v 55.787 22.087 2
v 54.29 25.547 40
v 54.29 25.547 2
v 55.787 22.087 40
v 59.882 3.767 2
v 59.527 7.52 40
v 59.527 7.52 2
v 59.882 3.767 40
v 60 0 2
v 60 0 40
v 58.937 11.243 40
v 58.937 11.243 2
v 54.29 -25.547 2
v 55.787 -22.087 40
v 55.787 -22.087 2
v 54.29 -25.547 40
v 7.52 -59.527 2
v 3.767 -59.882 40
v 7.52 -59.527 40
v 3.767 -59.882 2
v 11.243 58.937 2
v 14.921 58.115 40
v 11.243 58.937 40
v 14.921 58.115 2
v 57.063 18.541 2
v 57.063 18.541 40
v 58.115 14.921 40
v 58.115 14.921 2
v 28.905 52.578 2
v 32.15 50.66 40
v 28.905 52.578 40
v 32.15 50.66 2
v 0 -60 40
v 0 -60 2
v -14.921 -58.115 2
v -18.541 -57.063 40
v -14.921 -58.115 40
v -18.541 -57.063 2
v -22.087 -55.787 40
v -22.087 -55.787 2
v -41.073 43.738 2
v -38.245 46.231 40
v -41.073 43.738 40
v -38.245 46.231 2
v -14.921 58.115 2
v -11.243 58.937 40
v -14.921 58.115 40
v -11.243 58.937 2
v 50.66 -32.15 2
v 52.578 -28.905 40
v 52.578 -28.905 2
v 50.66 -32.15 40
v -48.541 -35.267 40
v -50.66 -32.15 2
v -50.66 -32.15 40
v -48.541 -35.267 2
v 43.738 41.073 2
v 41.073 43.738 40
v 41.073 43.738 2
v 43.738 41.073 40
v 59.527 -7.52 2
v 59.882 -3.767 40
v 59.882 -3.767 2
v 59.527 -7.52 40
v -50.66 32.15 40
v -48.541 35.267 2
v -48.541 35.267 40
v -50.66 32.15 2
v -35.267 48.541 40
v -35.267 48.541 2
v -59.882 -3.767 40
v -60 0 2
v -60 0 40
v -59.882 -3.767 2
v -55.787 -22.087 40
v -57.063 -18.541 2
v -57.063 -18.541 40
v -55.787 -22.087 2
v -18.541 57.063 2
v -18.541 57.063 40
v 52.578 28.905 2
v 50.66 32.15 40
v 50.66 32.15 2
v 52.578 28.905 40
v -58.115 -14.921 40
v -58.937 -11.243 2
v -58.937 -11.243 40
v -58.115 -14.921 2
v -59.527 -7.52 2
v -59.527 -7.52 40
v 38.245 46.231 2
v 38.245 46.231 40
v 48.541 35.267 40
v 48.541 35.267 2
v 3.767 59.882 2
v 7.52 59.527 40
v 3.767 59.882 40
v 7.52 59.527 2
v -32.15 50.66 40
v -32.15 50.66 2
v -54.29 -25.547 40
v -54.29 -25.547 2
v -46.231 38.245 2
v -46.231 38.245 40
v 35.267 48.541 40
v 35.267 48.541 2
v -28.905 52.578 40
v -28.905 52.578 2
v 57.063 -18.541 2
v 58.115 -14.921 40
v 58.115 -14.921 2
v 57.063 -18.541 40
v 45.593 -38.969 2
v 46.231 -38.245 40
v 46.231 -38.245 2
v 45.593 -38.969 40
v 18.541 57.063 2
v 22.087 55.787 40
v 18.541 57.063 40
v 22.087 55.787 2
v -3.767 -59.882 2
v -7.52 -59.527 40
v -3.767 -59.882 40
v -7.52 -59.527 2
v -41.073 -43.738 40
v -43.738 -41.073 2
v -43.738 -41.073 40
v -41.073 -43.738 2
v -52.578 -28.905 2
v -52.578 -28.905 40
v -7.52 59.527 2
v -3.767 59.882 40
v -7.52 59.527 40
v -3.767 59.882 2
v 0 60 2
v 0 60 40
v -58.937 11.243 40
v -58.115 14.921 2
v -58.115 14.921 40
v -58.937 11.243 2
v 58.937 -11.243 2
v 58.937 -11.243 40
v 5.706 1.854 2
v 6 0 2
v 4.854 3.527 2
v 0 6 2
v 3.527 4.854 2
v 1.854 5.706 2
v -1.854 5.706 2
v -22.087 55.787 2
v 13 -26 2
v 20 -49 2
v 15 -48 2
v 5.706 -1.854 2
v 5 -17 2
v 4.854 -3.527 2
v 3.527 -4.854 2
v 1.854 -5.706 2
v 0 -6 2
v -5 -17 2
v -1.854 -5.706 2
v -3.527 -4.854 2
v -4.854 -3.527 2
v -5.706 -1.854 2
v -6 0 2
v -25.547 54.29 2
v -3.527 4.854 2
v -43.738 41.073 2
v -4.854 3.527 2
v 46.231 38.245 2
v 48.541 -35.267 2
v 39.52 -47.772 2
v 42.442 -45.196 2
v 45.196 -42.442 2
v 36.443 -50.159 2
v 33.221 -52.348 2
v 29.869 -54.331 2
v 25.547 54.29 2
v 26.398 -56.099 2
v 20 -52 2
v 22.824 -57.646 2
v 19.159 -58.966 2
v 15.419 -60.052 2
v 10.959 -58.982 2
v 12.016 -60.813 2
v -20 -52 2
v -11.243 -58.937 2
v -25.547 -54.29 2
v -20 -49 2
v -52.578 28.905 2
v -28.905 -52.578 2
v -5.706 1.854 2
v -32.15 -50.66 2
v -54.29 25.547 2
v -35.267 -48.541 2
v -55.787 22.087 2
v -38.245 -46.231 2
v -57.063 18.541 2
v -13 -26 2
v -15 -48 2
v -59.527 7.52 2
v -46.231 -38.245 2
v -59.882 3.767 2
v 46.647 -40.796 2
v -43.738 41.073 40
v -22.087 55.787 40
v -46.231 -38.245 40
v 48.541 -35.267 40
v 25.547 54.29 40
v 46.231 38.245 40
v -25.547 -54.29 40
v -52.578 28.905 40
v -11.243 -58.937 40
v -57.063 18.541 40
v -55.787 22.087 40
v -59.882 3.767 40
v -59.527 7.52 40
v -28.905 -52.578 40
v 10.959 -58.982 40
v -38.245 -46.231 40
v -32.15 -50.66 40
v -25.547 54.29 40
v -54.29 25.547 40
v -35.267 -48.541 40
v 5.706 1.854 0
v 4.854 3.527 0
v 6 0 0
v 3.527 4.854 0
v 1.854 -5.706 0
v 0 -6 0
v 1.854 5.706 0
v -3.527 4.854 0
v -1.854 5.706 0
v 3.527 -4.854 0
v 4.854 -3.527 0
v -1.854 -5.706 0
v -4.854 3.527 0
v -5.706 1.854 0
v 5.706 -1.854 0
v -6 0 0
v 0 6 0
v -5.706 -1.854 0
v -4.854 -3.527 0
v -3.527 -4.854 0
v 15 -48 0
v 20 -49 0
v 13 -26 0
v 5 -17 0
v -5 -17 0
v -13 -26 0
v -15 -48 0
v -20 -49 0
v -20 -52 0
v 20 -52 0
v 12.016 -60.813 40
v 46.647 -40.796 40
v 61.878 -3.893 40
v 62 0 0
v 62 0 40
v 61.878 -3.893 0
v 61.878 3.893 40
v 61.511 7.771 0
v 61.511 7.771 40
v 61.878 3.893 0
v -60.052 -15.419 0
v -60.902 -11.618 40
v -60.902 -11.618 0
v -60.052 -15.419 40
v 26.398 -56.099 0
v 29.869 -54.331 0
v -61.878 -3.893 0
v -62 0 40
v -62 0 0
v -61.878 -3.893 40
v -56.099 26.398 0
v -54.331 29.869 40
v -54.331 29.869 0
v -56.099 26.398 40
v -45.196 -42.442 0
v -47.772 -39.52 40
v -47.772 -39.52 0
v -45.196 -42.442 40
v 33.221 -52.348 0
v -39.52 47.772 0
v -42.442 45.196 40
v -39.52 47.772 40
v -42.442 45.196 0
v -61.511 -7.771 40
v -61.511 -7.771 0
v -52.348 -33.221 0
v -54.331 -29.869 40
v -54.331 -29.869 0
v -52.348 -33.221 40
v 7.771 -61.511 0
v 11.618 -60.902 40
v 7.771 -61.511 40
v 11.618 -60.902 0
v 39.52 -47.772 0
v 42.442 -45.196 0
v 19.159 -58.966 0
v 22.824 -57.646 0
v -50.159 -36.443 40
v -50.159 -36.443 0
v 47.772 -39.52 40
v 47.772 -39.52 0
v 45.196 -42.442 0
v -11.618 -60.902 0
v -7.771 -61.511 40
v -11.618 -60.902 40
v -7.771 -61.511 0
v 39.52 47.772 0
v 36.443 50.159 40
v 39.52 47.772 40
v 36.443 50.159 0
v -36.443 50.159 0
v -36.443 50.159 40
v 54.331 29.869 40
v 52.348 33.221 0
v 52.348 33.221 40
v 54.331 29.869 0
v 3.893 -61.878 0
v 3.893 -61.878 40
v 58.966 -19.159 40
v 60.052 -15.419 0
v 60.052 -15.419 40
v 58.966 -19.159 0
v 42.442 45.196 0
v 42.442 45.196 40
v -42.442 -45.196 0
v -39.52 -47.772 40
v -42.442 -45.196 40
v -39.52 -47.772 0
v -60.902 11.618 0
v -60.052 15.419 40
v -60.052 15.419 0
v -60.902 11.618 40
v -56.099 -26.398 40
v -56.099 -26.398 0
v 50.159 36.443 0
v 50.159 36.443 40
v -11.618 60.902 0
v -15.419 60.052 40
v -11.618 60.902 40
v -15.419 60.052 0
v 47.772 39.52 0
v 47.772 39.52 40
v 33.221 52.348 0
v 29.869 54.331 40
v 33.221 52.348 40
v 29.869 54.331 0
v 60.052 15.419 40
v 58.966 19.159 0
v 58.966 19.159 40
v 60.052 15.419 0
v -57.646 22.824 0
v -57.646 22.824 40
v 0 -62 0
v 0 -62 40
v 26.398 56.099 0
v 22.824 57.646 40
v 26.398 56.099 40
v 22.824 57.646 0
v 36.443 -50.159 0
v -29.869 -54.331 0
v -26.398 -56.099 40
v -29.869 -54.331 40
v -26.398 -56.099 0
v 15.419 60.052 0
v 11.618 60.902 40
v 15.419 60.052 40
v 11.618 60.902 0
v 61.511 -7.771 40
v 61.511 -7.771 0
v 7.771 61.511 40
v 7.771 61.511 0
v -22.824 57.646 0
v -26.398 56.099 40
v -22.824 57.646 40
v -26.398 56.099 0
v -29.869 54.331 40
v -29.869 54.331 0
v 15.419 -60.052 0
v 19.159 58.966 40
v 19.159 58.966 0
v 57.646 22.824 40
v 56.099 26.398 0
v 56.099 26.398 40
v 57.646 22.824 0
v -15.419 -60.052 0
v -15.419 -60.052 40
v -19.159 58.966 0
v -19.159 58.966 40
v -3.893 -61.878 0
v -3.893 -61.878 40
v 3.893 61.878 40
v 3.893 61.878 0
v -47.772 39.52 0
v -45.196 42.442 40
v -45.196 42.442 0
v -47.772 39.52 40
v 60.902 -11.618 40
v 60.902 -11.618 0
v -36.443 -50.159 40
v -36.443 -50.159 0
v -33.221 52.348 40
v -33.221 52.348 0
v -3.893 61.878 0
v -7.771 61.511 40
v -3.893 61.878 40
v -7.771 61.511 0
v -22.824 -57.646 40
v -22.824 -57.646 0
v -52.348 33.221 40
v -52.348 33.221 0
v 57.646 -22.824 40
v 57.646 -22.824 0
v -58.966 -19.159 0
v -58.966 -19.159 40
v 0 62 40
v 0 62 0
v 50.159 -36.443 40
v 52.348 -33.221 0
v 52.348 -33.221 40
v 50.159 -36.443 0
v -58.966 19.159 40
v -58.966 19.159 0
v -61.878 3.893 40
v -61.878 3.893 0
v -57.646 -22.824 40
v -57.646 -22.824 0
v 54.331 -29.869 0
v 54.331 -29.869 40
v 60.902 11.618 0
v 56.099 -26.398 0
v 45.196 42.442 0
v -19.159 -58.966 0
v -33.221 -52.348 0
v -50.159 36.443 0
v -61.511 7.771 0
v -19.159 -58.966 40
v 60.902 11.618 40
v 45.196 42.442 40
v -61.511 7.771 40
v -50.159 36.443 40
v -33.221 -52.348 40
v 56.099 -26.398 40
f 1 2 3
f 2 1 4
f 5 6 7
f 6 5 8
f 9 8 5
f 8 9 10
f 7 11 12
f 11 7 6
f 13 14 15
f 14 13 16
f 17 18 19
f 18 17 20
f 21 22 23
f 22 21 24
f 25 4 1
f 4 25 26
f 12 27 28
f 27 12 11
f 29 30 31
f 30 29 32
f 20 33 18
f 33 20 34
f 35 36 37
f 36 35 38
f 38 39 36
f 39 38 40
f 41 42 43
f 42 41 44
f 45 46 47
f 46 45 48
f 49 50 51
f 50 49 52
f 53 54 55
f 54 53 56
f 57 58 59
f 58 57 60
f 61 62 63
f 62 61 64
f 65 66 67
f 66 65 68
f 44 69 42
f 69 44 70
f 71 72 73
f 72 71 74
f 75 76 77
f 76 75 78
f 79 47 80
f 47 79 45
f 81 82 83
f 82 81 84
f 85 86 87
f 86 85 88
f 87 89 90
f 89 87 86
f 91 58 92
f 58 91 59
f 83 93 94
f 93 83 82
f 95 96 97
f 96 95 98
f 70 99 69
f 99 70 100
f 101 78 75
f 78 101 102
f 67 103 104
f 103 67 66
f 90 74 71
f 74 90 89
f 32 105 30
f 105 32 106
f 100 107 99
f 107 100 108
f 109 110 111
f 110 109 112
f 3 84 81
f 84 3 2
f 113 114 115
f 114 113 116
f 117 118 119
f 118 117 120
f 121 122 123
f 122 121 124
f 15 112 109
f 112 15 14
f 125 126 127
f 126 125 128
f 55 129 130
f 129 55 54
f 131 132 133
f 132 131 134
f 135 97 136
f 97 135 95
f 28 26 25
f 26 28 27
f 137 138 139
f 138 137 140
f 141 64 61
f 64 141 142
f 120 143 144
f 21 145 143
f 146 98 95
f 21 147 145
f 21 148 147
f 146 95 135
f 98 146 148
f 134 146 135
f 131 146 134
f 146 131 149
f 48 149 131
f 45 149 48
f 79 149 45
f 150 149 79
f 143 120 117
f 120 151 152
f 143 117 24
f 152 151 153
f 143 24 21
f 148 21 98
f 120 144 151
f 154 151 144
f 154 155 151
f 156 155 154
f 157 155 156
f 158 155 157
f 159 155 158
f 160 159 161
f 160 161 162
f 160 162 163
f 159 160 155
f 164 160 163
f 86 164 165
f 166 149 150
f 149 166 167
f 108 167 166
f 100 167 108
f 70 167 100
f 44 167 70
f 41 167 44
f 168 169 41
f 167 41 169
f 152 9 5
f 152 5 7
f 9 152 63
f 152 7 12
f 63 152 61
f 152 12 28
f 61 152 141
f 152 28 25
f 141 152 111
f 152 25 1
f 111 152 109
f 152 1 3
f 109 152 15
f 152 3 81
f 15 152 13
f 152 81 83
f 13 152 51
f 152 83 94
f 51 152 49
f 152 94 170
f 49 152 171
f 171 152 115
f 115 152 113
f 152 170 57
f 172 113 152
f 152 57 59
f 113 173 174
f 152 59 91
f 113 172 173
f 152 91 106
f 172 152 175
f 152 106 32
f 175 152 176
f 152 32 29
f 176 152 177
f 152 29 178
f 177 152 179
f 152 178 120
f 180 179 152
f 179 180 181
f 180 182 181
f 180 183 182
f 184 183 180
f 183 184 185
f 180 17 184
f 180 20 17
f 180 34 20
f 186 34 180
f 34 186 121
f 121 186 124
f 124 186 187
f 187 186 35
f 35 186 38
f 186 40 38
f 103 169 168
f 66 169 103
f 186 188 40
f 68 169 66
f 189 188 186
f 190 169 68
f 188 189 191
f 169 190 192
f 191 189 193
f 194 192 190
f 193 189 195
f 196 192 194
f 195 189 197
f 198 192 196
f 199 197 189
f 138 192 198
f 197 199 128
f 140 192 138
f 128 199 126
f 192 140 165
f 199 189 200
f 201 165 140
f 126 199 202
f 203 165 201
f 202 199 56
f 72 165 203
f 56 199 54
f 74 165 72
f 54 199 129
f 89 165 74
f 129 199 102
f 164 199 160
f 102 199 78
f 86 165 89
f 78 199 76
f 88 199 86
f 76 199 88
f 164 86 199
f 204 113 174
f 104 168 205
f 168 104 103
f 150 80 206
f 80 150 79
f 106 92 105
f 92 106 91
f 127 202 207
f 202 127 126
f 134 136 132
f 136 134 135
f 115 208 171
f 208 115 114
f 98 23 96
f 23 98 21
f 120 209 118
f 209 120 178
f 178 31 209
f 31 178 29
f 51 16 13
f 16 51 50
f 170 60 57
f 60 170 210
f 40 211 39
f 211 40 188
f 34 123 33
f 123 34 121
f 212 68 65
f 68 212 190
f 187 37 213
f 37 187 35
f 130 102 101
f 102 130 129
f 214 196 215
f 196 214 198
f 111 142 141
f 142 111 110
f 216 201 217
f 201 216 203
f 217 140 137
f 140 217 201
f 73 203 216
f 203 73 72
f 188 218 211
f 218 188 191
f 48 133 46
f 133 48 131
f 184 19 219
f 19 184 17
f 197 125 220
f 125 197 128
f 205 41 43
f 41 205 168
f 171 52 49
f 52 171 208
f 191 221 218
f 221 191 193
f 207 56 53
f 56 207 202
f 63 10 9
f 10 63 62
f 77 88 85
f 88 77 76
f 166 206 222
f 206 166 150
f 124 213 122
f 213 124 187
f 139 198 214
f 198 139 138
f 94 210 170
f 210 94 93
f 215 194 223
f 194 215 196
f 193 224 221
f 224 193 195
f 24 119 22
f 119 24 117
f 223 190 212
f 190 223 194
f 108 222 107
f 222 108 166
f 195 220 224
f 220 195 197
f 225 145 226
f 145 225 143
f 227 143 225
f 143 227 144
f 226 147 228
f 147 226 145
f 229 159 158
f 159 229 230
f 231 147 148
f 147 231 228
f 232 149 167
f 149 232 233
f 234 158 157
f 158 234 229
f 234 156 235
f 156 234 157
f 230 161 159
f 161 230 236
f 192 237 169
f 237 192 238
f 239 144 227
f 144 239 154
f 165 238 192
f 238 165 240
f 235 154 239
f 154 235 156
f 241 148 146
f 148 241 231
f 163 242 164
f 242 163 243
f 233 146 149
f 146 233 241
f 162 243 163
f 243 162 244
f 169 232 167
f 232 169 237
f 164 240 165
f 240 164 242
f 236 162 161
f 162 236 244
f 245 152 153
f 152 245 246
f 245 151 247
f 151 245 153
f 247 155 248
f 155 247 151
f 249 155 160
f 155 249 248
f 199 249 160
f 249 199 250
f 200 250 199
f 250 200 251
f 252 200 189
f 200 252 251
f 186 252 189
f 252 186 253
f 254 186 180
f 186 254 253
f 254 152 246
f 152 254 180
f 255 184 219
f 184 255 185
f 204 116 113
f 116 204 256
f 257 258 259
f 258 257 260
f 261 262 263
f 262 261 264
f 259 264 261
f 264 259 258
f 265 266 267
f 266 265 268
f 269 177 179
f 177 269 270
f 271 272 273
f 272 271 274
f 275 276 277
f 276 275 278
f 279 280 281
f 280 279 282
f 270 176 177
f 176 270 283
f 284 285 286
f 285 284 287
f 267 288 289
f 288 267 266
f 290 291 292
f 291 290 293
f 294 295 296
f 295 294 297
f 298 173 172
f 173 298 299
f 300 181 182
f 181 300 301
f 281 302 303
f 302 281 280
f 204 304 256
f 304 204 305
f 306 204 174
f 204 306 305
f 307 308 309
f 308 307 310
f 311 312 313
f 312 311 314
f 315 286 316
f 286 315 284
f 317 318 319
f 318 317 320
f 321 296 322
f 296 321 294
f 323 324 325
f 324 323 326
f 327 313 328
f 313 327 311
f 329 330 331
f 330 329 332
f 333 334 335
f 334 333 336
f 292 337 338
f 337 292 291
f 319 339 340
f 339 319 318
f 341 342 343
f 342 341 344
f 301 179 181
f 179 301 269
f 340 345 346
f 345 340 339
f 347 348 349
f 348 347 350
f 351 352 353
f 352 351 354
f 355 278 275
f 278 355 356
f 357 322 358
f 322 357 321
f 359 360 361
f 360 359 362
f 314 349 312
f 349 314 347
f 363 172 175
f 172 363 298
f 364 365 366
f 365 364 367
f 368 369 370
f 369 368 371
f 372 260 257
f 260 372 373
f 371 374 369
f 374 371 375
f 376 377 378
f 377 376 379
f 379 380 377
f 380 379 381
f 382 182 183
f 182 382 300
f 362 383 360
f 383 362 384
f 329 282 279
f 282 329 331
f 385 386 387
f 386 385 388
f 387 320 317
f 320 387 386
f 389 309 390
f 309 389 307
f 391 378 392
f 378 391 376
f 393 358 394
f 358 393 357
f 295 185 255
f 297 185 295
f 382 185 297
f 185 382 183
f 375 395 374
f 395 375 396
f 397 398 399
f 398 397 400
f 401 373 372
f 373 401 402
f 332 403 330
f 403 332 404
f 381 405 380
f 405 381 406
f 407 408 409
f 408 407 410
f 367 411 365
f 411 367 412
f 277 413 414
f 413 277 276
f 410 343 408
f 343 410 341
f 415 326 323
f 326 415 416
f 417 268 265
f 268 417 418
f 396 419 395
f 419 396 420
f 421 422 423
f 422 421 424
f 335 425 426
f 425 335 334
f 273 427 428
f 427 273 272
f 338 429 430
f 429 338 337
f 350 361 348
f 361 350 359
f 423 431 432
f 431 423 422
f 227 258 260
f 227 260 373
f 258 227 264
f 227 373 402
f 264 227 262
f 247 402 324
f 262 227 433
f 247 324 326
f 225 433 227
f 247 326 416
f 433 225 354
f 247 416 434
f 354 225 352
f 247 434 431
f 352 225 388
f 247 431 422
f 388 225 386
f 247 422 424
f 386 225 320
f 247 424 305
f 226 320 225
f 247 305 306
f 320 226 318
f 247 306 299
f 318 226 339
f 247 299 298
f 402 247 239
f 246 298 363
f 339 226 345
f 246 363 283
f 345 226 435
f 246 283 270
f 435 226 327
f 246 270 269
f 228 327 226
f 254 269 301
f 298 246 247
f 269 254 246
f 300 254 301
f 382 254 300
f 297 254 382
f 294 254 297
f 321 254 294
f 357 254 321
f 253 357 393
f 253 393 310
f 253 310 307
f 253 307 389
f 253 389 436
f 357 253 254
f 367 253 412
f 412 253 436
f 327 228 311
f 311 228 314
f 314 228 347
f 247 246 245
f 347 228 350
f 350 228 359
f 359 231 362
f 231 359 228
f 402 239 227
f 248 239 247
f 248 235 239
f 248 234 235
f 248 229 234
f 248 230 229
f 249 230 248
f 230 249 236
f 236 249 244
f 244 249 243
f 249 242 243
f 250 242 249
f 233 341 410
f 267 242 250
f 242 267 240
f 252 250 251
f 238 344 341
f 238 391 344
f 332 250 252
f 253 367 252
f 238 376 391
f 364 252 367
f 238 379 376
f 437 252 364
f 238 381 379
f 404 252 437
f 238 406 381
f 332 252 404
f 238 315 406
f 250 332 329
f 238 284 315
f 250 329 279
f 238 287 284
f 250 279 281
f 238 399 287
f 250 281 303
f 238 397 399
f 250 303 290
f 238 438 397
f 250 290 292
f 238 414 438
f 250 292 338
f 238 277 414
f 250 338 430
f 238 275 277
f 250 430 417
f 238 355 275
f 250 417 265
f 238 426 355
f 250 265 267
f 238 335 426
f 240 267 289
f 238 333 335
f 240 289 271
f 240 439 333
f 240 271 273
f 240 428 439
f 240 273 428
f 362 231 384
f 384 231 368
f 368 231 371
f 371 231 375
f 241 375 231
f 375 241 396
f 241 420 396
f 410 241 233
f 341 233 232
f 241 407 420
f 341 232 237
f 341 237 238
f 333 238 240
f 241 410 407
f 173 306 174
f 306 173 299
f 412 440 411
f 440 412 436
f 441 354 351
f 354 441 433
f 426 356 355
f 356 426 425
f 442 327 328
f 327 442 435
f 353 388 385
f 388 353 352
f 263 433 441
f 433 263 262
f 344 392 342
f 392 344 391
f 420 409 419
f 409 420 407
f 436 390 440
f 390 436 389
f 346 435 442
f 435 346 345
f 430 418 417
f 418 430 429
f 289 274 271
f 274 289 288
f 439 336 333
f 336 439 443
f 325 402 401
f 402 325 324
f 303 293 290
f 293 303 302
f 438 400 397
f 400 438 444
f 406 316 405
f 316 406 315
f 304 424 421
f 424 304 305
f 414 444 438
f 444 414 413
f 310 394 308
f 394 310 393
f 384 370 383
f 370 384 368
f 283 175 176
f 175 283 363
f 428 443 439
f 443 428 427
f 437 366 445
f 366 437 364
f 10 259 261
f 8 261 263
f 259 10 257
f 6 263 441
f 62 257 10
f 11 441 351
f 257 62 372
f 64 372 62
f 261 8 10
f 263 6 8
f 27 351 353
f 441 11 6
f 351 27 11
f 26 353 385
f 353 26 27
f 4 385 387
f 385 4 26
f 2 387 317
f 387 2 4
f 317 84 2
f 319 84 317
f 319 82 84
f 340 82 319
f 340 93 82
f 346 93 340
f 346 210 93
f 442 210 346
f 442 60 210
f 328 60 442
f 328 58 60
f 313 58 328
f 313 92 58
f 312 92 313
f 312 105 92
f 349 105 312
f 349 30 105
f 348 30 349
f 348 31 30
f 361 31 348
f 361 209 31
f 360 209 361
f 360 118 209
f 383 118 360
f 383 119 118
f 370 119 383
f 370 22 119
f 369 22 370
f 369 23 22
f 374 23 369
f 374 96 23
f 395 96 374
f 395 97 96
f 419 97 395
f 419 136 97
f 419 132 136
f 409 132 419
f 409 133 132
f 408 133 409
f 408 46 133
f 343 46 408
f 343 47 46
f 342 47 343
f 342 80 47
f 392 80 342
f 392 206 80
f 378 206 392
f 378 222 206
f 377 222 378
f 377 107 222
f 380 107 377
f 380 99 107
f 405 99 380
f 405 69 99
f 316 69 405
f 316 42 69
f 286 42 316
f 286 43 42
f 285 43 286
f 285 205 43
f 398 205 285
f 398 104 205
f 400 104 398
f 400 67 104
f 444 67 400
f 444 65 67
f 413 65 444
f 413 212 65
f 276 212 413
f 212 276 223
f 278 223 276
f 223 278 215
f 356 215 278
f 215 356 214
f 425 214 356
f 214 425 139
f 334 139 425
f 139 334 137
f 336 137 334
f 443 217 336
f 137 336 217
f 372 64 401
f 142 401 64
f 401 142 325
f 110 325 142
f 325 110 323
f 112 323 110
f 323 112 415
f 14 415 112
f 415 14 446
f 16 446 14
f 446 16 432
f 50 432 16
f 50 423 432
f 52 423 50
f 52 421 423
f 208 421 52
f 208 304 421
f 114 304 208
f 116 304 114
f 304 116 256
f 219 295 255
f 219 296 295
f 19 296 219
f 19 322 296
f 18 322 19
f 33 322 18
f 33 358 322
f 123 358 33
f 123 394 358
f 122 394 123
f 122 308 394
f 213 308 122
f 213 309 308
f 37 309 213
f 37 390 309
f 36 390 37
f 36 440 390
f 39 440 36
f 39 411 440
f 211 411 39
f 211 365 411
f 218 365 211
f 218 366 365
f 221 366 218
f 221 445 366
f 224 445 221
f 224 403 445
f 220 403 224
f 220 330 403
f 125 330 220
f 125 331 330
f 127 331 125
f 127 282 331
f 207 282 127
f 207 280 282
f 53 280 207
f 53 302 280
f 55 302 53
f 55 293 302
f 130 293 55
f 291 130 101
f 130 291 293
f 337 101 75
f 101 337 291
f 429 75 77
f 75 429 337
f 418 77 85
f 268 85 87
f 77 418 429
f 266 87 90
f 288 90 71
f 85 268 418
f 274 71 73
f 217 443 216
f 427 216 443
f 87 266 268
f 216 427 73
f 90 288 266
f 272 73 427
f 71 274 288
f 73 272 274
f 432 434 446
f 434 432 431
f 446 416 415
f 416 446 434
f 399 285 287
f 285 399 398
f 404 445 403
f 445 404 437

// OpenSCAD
// a polygon that approximates a coffee pod (comfortably larger than a pod)
module capsule_cutout() {
    polygon(points=[[-20,0],[20,0],[20,3],[15,4],[13,26],[5,35],[-5,35],[-13,26],[-15,4],[-20,3]]);
}

module capsule_cutout_outer() {
    polygon(points=[[-22,-2],[22,-2],[22,5],[17,6],[15,28],[7,37],[1,37],[1,47],[-1,47],[-1,37],[-7,37],[-15,28],[-17,6],[-22,5]]);
}

// open the downward looking face of the capsule polygon.
// used in places where the capsule is ejected
module capsule_cutout_openface() {
    union() {
        capsule_cutout();
        polygon(points=[[-20,0],[20,0],[20,-40],[-20,-40]]);
    }
}

module capsule_outline_open() {
    polygon(points=[[20,0],[20,3],[15,4],[13,26],[5,35],
                            [-5,35],[-13,26],[-15,4],[-20,3],[-20,-2],
                            [-22,-2],[-22,5],[-17,6],[-15,28],[-7,37],
                            [-1,37],[-1,65],[1,65],[1,37],
                            [7,37],[15,28],[17,6],[22,5],[22,-2],[20,-2]]);
    
    
}

module bearing() {
    cylinder($fn=50,r=9,h=6);
    translate([0,0,5.99]) cylinder($fn=50,r=11.5,h=8+6);
}

module axle() {
    cylinder($fn=30,r=4.5,h=100, center=true);
}



module materialsaver() {
    polygon(points=[[-6,0],[-3,0],[-3,-8],[3,-8],[3,0],[6,0],[0,15]]);
}

// a hexagonal pattern of coffeecup pod cutouts, plus some material saver
module standing_column_cutouts(height=80) {
    linear_extrude(h=height)
    for (angle=[0,60,120,180,240,300]) {
        rotate([0,0,angle]) translate([0,-52,0]) capsule_cutout();
        rotate([0,0,angle+30]) translate([0,-48,0]) materialsaver();
    }
    
}

module standing_column_v2(radius=60, height=80) {
    for (angle=[0,60,120,180,240,300]) {
        rotate([0,0,angle]) 
        translate([0,-52,0]) linear_extrude(height=height) 
        difference() {
            capsule_cutout_outer();
            capsule_cutout();
        }    
    }
    difference() {
        cylinder($fn=30, r=6, h=height);
        translate([0,0,-1]) cylinder($fn=20,r=4,h=height+2);
    }
     difference() {
        cylinder($fn=100,r=radius+2,h=height);
        translate([0,0,-1]) cylinder($fn=100,r=radius,h=height+2);
     }   
}

// height of this thing has to be an exact coffee cup.
module selector() {
    standing_column(height=40);
}


module ejector_base(radius=60,height=30,height2=30) {
    angle=45;
    m = [[ 1, 0, 0, 0],
         [ 0, 1, -0.3, 0],
         [ 0, 0, 1, 0],
         [ 0, 0, 0, 1]];
    translate([0,0,height])
    rotate([180,0,30])
    difference() {
        cylinder($fn=100,r=radius,h=height);
        translate([0, 0,-1]) multmatrix(m) linear_extrude(h=height) translate([0,-52,0]) capsule_cutout_openface();
    }
    
    translate([0,0,height])
    difference() {
        cylinder($fn=100, r=radius, h=height2);
        translate([0,0,-0.001]) cylinder($fn=100, r=radius-2, h=height2+0.002);
    }
}

// middle box. stands still, axis revolves around it.

module ejector_mid(radius=62,capsuleheight=37,ejectorheight=40) {
    difference() {
        cylinder($fn=100, r=radius, h=ejectorheight);
        union() {
            translate([0,0,1.5]) cylinder($fn=100, r=radius-2, ejectorheight);
            translate([0,-52,-1]) linear_extrude(height=3) capsule_cutout();
            axle();
            translate([0,0,14]) rotate([180,0,0])  bearing();
        }
    }
    // capsule cutout
    translate([0,-52,0]) linear_extrude(height=capsuleheight) 
    difference() {
        capsule_cutout_outer();
        capsule_cutout();
    }
    difference() {
        cylinder($fn=50,r=16,h=capsuleheight);
        union() {
            translate([0,0,capsuleheight-14+0.01]) bearing();
            translate([0,0,14]) rotate([180,0,0])  bearing();
            axle();
        }
    }
}

module ejector2(radius=60,height=40) {
    m = [[ 1, 0, 0, 0],
         [ 0, 1, -0.3, 0],
         [ 0, 0, 1, 0],
         [ 0, 0, 0, 1]];
    difference() {
        intersection() {
            union() {
                cylinder($fn=30,h=height,r=7);
                for (angle=[0,60,120,180,240,300]) {
                    rotate([0,0,angle]) translate([0,-52,0]) multmatrix(m) 
                    linear_extrude(height=height) 
                        capsule_outline_open();
                }
            }
            cylinder($fn=100, r=radius, h=height);
        }
        union() {
            translate([0,0,-1]) cylinder($fn=30,h=height/3,r=4.5);
            translate([0,0,height*0.66]) cylinder($fn=30,h=height,r=2.3);
            //translate([0,0,height/2]) cylinder($fn=30,r=22,h=height/2);
        }
    }
}



// director plate. sits below middle box, ejects capsule when in position.
module director_plate(radius=58, height=2) {
    difference() {
        cylinder($fn=100, r=radius, h=height);
        axle();
        translate([0,-52,-0.01]) linear_extrude(height=10) capsule_cutout();
    }
}


module base(height=20) {
    difference() {
        cylinder($fn=100, r=60, h=height);
        union() {
            // axle hole
            translate([0,0,-1]) cylinder($fn=20, r=4, h=height+2);
            // upper screw
            translate([0,0,-0.01]) cylinder($fn=20, r=8, h=6);
            // lower screw
            translate([0,0,height-6+0.01]) cylinder($fn=20, r=8, h=6);
            // weight savers
            // leg holders
        }
    }
}


module base2(radius=60, height=40) {
    difference() {
        cylinder($fn=100,r=radius+2,h=height);
        union() {
            // cavity for base
            translate([0,0,2]) cylinder($fn=100,r=radius,h=height+2);
            // axle hole
            translate([0,0,-1]) cylinder($fn=20,r=6, h=height);
            // capsule cutout (horizontal)
            translate([0,-52,-0.01]) linear_extrude(height=10) capsule_cutout();
            // capsule cutout (vertical)
            rotate([0,0,30]) translate([0, -radius, height/2+2]) cube([40,40,40], center=true);
        }
    }   
}

//translate ([0,0,74]) standing_column();
//translate([0,0,32]) rotate([0,0,$t*100]) selector();
//ejector_mid();
//translate([0,0,38]) director_plate();
//bearing();

//base();

//standing_column_v2();

//ejector2();
 base2();
